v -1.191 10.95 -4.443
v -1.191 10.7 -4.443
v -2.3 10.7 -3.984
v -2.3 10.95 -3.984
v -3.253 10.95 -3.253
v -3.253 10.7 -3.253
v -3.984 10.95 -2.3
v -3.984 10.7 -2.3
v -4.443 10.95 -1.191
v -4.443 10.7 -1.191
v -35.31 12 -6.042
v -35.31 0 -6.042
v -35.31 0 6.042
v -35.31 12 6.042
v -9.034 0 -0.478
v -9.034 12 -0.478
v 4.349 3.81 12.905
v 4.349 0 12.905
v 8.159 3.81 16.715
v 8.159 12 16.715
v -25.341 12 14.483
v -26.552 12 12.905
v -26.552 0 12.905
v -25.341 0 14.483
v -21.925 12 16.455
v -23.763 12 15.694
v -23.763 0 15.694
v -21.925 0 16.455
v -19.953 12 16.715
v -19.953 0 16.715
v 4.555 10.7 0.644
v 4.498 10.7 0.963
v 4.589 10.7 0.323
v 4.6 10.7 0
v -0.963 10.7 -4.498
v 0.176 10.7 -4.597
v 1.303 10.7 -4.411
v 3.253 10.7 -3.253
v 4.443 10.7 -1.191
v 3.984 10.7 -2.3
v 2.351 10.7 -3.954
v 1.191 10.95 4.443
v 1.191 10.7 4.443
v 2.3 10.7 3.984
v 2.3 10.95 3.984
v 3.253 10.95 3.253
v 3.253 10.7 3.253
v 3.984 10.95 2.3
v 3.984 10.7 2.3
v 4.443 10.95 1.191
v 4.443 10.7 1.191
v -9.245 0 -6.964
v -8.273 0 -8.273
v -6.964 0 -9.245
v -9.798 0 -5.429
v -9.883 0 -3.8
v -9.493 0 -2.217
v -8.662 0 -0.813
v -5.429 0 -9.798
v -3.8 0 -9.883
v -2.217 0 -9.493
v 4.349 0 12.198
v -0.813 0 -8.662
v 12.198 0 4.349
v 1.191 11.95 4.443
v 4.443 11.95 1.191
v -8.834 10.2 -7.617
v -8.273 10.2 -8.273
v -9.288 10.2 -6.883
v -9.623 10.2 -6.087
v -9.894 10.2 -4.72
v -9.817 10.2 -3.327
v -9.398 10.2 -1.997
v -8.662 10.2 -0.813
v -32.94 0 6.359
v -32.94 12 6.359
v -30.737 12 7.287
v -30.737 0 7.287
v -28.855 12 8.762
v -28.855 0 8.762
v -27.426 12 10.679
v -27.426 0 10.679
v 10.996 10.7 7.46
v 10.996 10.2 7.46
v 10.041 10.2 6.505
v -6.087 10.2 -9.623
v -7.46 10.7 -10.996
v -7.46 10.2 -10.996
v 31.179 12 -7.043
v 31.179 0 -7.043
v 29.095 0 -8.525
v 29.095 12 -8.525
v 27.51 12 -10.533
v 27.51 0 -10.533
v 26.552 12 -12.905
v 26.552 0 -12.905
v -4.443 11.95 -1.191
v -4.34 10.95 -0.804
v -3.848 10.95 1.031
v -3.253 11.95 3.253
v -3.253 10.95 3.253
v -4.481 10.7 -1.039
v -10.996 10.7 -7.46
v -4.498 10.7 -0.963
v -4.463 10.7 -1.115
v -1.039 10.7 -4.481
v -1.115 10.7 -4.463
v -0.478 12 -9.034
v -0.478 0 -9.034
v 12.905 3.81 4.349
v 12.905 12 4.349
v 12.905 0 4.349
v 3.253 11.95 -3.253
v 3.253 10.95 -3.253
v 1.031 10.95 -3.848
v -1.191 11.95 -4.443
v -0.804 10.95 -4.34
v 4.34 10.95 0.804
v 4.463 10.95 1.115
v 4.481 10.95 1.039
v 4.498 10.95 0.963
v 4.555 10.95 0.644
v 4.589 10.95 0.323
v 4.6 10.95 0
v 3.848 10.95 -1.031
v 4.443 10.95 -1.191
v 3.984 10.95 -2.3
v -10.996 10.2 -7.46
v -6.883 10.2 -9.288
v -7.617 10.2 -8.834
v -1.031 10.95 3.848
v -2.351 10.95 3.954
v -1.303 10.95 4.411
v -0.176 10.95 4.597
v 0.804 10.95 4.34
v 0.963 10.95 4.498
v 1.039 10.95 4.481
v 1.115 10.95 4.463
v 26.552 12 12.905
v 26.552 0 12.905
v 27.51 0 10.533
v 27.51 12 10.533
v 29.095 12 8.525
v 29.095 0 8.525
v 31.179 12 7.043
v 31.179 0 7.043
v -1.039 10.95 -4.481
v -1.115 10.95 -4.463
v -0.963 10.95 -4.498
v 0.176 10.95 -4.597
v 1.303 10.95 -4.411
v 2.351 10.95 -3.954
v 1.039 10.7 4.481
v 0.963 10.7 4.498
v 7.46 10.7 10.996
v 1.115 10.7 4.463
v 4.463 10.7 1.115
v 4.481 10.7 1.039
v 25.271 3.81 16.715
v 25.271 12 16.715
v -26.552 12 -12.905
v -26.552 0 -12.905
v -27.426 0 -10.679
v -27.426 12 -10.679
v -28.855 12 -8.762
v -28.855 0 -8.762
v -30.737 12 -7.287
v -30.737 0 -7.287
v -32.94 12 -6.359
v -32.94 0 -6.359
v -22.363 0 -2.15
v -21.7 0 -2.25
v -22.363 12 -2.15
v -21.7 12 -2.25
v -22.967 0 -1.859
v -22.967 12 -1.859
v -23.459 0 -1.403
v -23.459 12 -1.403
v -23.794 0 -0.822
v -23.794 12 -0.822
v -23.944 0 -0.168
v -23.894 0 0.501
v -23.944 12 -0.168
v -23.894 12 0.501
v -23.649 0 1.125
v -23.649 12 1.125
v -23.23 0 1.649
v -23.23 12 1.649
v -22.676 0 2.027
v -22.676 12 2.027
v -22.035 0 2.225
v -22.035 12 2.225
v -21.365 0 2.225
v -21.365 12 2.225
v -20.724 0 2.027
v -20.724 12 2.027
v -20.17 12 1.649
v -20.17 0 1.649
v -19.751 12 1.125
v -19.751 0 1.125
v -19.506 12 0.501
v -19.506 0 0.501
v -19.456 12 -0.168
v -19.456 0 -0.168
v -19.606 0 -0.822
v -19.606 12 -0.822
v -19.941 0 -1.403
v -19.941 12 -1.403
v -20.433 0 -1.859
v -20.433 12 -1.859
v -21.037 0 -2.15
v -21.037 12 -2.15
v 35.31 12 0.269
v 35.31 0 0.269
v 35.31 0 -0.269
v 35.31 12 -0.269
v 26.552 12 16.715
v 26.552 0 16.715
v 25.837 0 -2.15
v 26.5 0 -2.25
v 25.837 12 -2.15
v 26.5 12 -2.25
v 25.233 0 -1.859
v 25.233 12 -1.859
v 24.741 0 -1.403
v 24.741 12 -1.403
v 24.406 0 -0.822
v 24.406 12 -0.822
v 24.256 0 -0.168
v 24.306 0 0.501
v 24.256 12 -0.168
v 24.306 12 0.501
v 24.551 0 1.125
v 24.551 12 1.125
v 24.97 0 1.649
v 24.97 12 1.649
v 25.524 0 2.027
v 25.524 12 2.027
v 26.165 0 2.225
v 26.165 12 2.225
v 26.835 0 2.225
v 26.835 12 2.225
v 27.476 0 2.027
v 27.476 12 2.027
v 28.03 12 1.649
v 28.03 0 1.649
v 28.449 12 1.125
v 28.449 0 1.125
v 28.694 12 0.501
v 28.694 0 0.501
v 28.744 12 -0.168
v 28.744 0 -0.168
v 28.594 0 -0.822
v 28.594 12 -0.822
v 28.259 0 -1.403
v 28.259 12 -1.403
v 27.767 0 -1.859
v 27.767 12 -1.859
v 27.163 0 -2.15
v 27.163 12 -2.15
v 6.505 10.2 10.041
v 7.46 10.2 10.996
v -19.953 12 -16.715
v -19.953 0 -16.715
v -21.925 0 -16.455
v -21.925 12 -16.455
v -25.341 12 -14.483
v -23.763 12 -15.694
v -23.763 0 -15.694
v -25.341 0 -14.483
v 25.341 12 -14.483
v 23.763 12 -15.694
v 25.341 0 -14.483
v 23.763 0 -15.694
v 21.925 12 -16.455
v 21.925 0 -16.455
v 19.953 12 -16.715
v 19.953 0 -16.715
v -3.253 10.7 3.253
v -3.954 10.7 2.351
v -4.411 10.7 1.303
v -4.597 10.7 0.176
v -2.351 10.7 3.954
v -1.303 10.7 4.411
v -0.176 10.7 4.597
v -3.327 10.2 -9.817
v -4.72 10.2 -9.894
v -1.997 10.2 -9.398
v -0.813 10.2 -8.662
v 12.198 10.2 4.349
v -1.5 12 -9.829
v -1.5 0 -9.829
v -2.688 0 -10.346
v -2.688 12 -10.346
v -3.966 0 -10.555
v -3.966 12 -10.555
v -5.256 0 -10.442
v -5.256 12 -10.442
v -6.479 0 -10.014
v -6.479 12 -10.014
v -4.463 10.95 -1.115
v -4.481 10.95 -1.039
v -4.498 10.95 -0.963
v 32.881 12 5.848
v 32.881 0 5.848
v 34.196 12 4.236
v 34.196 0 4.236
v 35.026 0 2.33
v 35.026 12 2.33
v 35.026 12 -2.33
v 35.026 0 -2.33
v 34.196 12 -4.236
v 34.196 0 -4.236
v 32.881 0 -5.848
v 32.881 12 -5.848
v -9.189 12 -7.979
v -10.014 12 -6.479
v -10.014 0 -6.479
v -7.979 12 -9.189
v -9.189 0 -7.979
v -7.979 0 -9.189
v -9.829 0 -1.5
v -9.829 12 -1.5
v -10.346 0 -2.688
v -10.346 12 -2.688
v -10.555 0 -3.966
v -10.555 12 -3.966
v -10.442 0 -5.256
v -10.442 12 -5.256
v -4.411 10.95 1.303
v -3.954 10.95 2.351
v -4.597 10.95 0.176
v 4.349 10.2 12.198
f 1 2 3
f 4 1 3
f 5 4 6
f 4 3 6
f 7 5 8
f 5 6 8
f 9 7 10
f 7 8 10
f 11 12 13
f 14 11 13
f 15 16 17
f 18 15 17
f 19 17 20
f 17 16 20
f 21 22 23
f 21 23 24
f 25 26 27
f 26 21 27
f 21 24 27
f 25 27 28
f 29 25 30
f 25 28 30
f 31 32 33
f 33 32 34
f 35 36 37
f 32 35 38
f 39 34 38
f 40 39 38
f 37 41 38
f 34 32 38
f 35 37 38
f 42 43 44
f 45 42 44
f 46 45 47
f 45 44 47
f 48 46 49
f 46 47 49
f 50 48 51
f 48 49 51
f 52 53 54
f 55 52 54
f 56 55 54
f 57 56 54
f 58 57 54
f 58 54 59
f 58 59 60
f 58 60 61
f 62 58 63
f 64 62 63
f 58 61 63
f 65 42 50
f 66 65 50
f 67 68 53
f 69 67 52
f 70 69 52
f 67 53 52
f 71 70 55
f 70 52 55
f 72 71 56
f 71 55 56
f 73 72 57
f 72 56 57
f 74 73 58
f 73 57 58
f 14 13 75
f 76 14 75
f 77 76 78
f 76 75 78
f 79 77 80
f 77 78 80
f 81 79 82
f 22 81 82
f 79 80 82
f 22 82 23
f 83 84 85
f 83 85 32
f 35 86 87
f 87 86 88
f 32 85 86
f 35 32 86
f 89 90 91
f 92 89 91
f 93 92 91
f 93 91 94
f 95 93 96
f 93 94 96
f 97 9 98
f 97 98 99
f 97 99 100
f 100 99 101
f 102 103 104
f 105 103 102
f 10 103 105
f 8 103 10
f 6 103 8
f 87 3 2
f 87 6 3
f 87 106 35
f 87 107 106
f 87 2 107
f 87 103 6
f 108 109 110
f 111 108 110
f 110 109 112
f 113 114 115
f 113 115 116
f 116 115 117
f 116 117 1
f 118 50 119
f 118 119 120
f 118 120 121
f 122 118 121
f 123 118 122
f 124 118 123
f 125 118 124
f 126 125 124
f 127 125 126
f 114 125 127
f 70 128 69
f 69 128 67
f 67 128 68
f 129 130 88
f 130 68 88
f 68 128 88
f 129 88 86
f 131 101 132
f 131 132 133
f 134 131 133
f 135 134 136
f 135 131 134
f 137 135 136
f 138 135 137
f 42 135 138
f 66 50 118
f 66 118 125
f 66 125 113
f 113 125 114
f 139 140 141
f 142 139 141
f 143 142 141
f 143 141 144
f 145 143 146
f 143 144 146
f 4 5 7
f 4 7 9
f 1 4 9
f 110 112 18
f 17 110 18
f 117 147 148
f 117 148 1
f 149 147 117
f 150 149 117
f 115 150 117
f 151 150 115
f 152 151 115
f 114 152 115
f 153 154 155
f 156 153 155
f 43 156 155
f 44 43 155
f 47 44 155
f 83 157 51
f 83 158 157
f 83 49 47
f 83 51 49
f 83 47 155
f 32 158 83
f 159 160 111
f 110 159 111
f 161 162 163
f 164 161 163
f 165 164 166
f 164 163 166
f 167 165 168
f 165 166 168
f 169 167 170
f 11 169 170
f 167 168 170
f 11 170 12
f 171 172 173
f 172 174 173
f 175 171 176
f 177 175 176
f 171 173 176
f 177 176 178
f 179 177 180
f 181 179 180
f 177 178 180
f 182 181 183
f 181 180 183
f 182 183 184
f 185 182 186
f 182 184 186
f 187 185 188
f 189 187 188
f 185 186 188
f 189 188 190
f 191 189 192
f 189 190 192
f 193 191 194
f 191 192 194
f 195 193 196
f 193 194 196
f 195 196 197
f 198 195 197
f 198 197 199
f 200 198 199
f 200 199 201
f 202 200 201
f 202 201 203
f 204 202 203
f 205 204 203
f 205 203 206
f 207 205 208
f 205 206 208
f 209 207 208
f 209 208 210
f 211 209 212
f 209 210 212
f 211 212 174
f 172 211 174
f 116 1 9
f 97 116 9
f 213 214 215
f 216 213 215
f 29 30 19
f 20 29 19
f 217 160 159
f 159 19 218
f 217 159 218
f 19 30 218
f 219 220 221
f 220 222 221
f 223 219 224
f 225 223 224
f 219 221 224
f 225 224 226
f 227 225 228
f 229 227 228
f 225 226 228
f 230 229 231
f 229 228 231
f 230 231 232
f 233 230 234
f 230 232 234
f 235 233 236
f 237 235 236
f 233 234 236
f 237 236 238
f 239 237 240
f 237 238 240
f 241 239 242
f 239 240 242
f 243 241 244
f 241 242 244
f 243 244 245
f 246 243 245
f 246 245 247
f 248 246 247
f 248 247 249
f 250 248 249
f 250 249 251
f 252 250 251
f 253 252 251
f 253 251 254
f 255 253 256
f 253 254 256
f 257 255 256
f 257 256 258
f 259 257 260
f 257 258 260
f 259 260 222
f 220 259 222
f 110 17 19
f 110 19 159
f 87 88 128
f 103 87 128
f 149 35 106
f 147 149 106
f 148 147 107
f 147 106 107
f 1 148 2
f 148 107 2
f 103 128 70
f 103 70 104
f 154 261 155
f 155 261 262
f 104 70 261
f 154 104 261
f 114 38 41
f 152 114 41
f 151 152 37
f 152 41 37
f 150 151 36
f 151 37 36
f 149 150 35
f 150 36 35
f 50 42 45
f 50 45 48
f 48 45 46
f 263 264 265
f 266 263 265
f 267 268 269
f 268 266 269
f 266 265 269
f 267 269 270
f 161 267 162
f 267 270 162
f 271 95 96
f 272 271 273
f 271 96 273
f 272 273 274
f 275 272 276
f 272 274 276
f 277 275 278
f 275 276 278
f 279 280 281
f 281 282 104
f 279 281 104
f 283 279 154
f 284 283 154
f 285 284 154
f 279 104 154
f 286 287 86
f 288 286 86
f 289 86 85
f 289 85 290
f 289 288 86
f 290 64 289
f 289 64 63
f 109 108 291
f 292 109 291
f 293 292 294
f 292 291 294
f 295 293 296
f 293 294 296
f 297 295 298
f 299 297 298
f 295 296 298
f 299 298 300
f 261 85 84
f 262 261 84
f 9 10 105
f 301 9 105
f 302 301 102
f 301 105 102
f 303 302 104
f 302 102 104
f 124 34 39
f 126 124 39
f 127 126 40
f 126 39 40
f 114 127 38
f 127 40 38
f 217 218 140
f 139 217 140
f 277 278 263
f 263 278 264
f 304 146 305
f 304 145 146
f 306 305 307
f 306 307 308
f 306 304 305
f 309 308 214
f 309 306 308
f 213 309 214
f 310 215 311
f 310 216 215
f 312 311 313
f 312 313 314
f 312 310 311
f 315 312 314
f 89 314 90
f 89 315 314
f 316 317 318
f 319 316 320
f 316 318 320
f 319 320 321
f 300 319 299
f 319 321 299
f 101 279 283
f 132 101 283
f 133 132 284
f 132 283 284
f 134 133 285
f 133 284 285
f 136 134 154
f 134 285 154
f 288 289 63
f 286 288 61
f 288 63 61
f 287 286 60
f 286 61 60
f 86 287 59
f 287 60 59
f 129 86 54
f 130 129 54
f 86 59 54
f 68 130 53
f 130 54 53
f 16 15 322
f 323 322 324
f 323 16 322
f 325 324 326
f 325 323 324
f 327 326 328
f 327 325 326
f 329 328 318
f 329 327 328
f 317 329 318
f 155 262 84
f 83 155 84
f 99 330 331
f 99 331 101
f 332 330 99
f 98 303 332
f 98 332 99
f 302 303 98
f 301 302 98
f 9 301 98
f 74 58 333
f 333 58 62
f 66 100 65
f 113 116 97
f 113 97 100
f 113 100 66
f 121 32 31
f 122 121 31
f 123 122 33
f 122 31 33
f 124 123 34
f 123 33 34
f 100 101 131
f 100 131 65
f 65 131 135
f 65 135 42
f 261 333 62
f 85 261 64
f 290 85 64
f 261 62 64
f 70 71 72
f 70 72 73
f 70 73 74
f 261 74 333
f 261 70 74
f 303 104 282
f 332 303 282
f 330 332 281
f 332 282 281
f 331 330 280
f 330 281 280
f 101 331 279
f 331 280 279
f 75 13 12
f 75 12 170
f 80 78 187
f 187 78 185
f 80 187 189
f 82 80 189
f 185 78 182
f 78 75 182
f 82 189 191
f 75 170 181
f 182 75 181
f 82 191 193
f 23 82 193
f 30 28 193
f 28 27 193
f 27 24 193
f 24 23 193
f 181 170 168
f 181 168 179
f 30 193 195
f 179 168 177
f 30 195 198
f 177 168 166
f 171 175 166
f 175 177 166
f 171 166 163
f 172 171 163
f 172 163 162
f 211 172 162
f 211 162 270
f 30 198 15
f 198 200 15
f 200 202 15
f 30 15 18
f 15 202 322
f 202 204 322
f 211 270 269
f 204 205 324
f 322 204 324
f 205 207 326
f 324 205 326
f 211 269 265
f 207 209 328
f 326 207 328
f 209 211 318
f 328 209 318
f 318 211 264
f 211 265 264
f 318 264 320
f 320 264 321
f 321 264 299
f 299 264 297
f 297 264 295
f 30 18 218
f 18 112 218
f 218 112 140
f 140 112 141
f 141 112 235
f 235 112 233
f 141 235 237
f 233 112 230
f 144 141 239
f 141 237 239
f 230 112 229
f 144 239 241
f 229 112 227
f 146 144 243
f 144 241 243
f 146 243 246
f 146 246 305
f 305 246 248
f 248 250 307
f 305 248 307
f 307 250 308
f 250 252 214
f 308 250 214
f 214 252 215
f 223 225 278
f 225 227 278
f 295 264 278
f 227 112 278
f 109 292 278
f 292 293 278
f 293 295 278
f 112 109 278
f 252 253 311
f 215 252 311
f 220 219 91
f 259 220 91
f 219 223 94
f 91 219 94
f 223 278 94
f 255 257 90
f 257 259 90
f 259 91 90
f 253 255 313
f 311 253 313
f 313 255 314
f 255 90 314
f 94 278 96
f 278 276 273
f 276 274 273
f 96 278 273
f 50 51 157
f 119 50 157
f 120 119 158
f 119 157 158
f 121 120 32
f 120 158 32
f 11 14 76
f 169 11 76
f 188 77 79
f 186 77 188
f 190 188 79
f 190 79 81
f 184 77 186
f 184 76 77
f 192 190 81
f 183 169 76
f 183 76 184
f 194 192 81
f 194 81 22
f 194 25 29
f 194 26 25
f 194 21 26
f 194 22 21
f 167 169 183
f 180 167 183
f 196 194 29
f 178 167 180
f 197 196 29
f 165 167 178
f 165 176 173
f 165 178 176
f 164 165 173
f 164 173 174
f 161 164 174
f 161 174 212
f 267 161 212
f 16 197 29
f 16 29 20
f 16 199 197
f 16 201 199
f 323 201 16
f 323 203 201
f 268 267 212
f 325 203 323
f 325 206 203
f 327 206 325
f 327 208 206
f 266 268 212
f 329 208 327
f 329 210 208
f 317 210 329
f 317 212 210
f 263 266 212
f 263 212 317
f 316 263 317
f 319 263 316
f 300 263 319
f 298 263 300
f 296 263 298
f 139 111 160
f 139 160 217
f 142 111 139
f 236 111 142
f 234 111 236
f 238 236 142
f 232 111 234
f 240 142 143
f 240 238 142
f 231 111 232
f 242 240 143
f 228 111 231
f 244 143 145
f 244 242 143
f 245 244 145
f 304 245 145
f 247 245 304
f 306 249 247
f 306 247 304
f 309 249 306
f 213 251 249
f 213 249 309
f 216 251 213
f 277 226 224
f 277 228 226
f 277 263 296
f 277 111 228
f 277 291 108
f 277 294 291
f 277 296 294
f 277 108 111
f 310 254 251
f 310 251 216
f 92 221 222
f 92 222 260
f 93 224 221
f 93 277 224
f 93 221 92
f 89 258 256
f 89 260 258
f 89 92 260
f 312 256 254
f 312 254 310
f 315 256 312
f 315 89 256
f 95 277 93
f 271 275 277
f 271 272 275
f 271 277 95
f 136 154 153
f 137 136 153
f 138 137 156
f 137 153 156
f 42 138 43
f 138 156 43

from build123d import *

# Parameters (mm, degrees)
BOSS_EXTRUDE1_DEPTH           = 10.2
BOSS_EXTRUDE2_DEPTH           = 0.5
BOSS_EXTRUDE4_DEPTH           = 0.25
BOSS_EXTRUDE5_DEPTH           = 1.25
BOSS_EXTRUDE6_DEPTH           = 12
CUT_EXTRUDE1_DEPTH            = 41.867802174
CUT_EXTRUDE2_DEPTH            = 8.19
SKETCH10_W                    = 2.25
SKETCH10_H                    = 12
M4_CLEARANCE_HOLE1_AT_2_COUNT = 2
M4_CLEARANCE_HOLE1_AT_2_PITCH = 48.2
FILLET1_R                     = 7.62
FILLET2_R                     = 7.62


with BuildPart() as part:
    # Sketch1 → Boss-Extrude1 (new body)
    with BuildSketch(Plane(origin=(0, 0, 0), x_dir=(1, 0, 0), z_dir=(0, 1, 0))):
        with BuildLine():
            ThreePointArc((-8.273149364, 8.273149316), (-9.899999094, 4.617835693), (-8.66205807, 0.813172798))
            Line((-8.66205807, 0.813172798), (4.348706704, -12.197591975))
            Line((4.348706704, -12.197591975), (12.197591975, -4.348706704))
            Line((12.197591975, -4.348706704), (-0.813172798, 8.66205807))
            ThreePointArc((-0.813172798, 8.66205807), (-4.617835727, 9.899999092), (-8.273149364, 8.273149316))
        make_face()
    extrude(amount=BOSS_EXTRUDE1_DEPTH)

    # Sketch2 → Boss-Extrude2 (add)
    with BuildSketch(Plane(origin=(0, 10.2, 0), x_dir=(1, 0, 0), z_dir=(0, 1, 0))):
        Polygon((-10.995510447, 7.459976542), (7.459976542, -10.995510447), (10.995510447, -7.459976542), (-7.459976542, 10.995510447), align=None)
    extrude(amount=BOSS_EXTRUDE2_DEPTH)



with BuildPart() as body_2:
    # Sketch3 → Boss-Extrude4 (new body)
    with BuildSketch(Plane(origin=(0, 10.7, 0), x_dir=(1, 0, 0), z_dir=(0, 1, 0))):
        with BuildLine():
            Line((2.816913201, -2.816913207), (1.190567607, -4.443258801))
            ThreePointArc((1.190567607, -4.443258801), (3.252691193, -3.252691193), (4.443258801, -1.190567607))
            Line((4.443258801, -1.190567607), (2.816913201, -2.816913207))
        make_face()
        with BuildLine():
            ThreePointArc((-3.252691193, -3.252691193), (-1.303419386, -4.411473439), (0.962617635, -4.498151541))
            Line((0.962617635, -4.498151541), (0.804197277, -4.339731183))
            Line((0.804197277, -4.339731183), (-1.031061719, -3.847975017))
            Line((-1.031061719, -3.847975017), (-3.252691193, -3.252691193))
        make_face()
        with BuildLine():
            Line((0.804197277, -4.339731183), (0.962617635, -4.498151541))
            ThreePointArc((0.962617635, -4.498151541), (1.07694242, -4.472157759), (1.190567607, -4.443258801))
            Line((1.190567607, -4.443258801), (0.804197277, -4.339731183))
        make_face()
        with BuildLine():
            ThreePointArc((-4.443258801, 1.190567607), (-4.472157759, 1.07694242), (-4.498151541, 0.962617635))
            Line((-4.498151541, 0.962617635), (-4.339731183, 0.804197277))
            Line((-4.339731183, 0.804197277), (-4.443258801, 1.190567607))
        make_face()
        with BuildLine():
            Line((-4.339731183, 0.804197277), (-4.498151541, 0.962617635))
            ThreePointArc((-4.498151541, 0.962617635), (-4.411473439, -1.303419386), (-3.252691193, -3.252691193))
            Line((-3.252691193, -3.252691193), (-3.847975039, -1.031061638))
            Line((-3.847975039, -1.031061638), (-4.339731183, 0.804197277))
        make_face()
        with BuildLine():
            ThreePointArc((-1.190567607, 4.443258801), (-3.252691193, 3.252691193), (-4.443258801, 1.190567607))
            Line((-4.443258801, 1.190567607), (-2.816913206, 2.816913202))
            Line((-2.816913206, 2.816913202), (-1.190567607, 4.443258801))
        make_face()
        with BuildLine():
            ThreePointArc((3.252691193, 3.252691193), (1.303419386, 4.411473439), (-0.962617635, 4.498151541))
            Line((-0.962617635, 4.498151541), (-0.804197277, 4.339731183))
            Line((-0.804197277, 4.339731183), (1.03106158, 3.847975054))
            Line((1.03106158, 3.847975054), (3.252691193, 3.252691193))
        make_face()
        with BuildLine():
            Line((-0.804197277, 4.339731183), (-0.962617635, 4.498151541))
            ThreePointArc((-0.962617635, 4.498151541), (-1.07694242, 4.472157759), (-1.190567607, 4.443258801))
            Line((-1.190567607, 4.443258801), (-0.804197277, 4.339731183))
        make_face()
        with BuildLine():
            ThreePointArc((4.443258801, -1.190567607), (4.472157759, -1.07694242), (4.498151541, -0.962617635))
            Line((4.498151541, -0.962617635), (4.339731183, -0.804197277))
            Line((4.339731183, -0.804197277), (4.443258801, -1.190567607))
        make_face()
        with BuildLine():
            Line((4.339731183, -0.804197277), (4.498151541, -0.962617635))
            ThreePointArc((4.498151541, -0.962617635), (4.574467023, -0.483995305), (4.6, 0))
            ThreePointArc((4.6, 0), (4.24984585, 1.760343789), (3.252691193, 3.252691193))
            Line((3.252691193, 3.252691193), (3.847975061, 1.031061553))
            Line((3.847975061, 1.031061553), (4.339731183, -0.804197277))
        make_face()
        with BuildLine():
            ThreePointArc((-3.252691193, -3.252691193), (-1.303419386, -4.411473439), (0.962617635, -4.498151541))
            Line((0.962617635, -4.498151541), (0.804197277, -4.339731183))
            Line((0.804197277, -4.339731183), (-1.031061719, -3.847975017))
            Line((-1.031061719, -3.847975017), (-3.252691193, -3.252691193))
        make_face()
        with BuildLine():
            Line((0.804197277, -4.339731183), (0.962617635, -4.498151541))
            ThreePointArc((0.962617635, -4.498151541), (1.07694242, -4.472157759), (1.190567607, -4.443258801))
            Line((1.190567607, -4.443258801), (0.804197277, -4.339731183))
        make_face()
        with BuildLine():
            ThreePointArc((-4.443258801, 1.190567607), (-4.472157759, 1.07694242), (-4.498151541, 0.962617635))
            Line((-4.498151541, 0.962617635), (-4.339731183, 0.804197277))
            Line((-4.339731183, 0.804197277), (-4.443258801, 1.190567607))
        make_face()
        with BuildLine():
            Line((-4.339731183, 0.804197277), (-4.498151541, 0.962617635))
            ThreePointArc((-4.498151541, 0.962617635), (-4.411473439, -1.303419386), (-3.252691193, -3.252691193))
            Line((-3.252691193, -3.252691193), (-3.847975039, -1.031061638))
            Line((-3.847975039, -1.031061638), (-4.339731183, 0.804197277))
        make_face()
        with BuildLine():
            ThreePointArc((3.252691193, 3.252691193), (1.303419386, 4.411473439), (-0.962617635, 4.498151541))
            Line((-0.962617635, 4.498151541), (-0.804197277, 4.339731183))
            Line((-0.804197277, 4.339731183), (1.03106158, 3.847975054))
            Line((1.03106158, 3.847975054), (3.252691193, 3.252691193))
        make_face()
        with BuildLine():
            Line((-0.804197277, 4.339731183), (-0.962617635, 4.498151541))
            ThreePointArc((-0.962617635, 4.498151541), (-1.07694242, 4.472157759), (-1.190567607, 4.443258801))
            Line((-1.190567607, 4.443258801), (-0.804197277, 4.339731183))
        make_face()
        with BuildLine():
            ThreePointArc((4.443258801, -1.190567607), (4.472157759, -1.07694242), (4.498151541, -0.962617635))
            Line((4.498151541, -0.962617635), (4.339731183, -0.804197277))
            Line((4.339731183, -0.804197277), (4.443258801, -1.190567607))
        make_face()
        with BuildLine():
            Line((4.339731183, -0.804197277), (4.498151541, -0.962617635))
            ThreePointArc((4.498151541, -0.962617635), (4.574467023, -0.483995305), (4.6, 0))
            ThreePointArc((4.6, 0), (4.24984585, 1.760343789), (3.252691193, 3.252691193))
            Line((3.252691193, 3.252691193), (3.847975061, 1.031061553))
            Line((3.847975061, 1.031061553), (4.339731183, -0.804197277))
        make_face()
    extrude(amount=BOSS_EXTRUDE4_DEPTH)


with BuildPart() as part_1:
    add(part.part)

    add(body_2.part)  # Boss-Extrude5 merges body 2
    # Sketch3<3> → Boss-Extrude5 (add)
    with BuildSketch(Plane(origin=(0, 10.7, 0), x_dir=(1, 0, 0), z_dir=(0, 1, 0))):
        Polygon((4.443258801, -1.190567607), (3.252691193, 3.252691193), (-1.190567607, 4.443258801), (-4.443258801, 1.190567607), (-3.252691193, -3.252691193), (1.190567607, -4.443258801), align=None)
    extrude(amount=BOSS_EXTRUDE5_DEPTH)


with BuildPart() as body_2_2:
    # Sketch5 → Boss-Extrude6 (new body)
    with BuildSketch(Plane(origin=(0, 0, 0), x_dir=(1, 0, 0), z_dir=(0, 1, 0))):
        with BuildLine():
            Line((26.551725125, -16.714698757), (26.551725125, -12.904698757))
            ThreePointArc((26.551725125, -12.904698757), (29.746675052, -7.962106389), (35.31, -6.042122046))
            Line((35.31, -6.042122046), (35.31, 6.042122046))
            ThreePointArc((35.31, 6.042122046), (29.746675052, 7.962106389), (26.551725125, 12.904698757))
            Line((26.551725125, 12.904698757), (26.551725125, 16.714698757))
            Line((26.551725125, 16.714698757), (-26.551725125, 16.714698757))
            Line((-26.551725125, 16.714698757), (-26.551725125, 12.904698757))
            ThreePointArc((-26.551725125, 12.904698757), (-29.746675052, 7.962106389), (-35.31, 6.042122046))
            Line((-35.31, 6.042122046), (-35.31, -6.042122046))
            ThreePointArc((-35.31, -6.042122046), (-29.746675052, -7.962106389), (-26.551725125, -12.904698757))
            Line((-26.551725125, -12.904698757), (-26.551725125, -16.714698757))
            Line((-26.551725125, -16.714698757), (26.551725125, -16.714698757))
        make_face()
        with BuildLine():
            Line((-9.033646769, 0.477654716), (-8.66205807, 0.813172798))
            ThreePointArc((-8.66205807, 0.813172798), (-9.8172278, 3.327283506), (-9.622773435, 6.08723953))
            Line((-9.622773435, 6.08723953), (-10.014231548, 6.478697642))
            ThreePointArc((-10.014231548, 6.478697642), (-8.62670273, 8.62670273), (-6.478697642, 10.014231548))
            Line((-6.478697642, 10.014231548), (-6.08723953, 9.622773435))
            ThreePointArc((-6.08723953, 9.622773435), (-3.327283506, 9.8172278), (-0.813172798, 8.66205807))
            Line((-0.813172798, 8.66205807), (-0.477654716, 9.033646769))
            Line((-0.477654716, 9.033646769), (12.904698757, -4.348706704))
            Line((12.904698757, -4.348706704), (4.348706704, -12.904698757))
            Line((4.348706704, -12.904698757), (-9.033646769, 0.477654716))
        make_face(mode=Mode.SUBTRACT)
    extrude(amount=BOSS_EXTRUDE6_DEPTH)

    # Sketch6 → Cut-Extrude1 (cut, through all)
    with BuildSketch(Plane(origin=(0, 12, 0), x_dir=(1, 0, 0), z_dir=(0, 1, 0))):
        with BuildLine():
            ThreePointArc((-9.033646769, 0.477654716), (-10.490761124, 3.320195156), (-10.014231548, 6.478697642))
            Line((-10.014231548, 6.478697642), (-9.622773435, 6.08723953))
            ThreePointArc((-9.622773435, 6.08723953), (-9.8172278, 3.327283506), (-8.66205807, 0.813172798))
            Line((-8.66205807, 0.813172798), (-9.033646769, 0.477654716))
        make_face()
        with BuildLine():
            ThreePointArc((-0.477654716, 9.033646769), (-3.320195156, 10.490761124), (-6.478697642, 10.014231548))
            Line((-6.478697642, 10.014231548), (-6.08723953, 9.622773435))
            ThreePointArc((-6.08723953, 9.622773435), (-3.327283506, 9.8172278), (-0.813172798, 8.66205807))
            Line((-0.813172798, 8.66205807), (-0.477654716, 9.033646769))
        make_face()
    extrude(amount=-CUT_EXTRUDE1_DEPTH, mode=Mode.SUBTRACT)

    # Sketch8 → Cut-Extrude2 (cut)
    with BuildSketch(Plane(origin=(0, 12, 0), x_dir=(1, 0, 0), z_dir=(0, 1, 0))):
        Polygon((12.904698757, -4.348706704), (4.348706704, -12.904698757), (8.158706704, -16.714698757), (25.270690809, -16.714698757), align=None)
    extrude(amount=-CUT_EXTRUDE2_DEPTH, mode=Mode.SUBTRACT)

    # Sketch10 → M4 Clearance Hole1 (revolve, cut)
    with BuildSketch(Plane(origin=(26.5, 0, 0), x_dir=(0, 0, -1), z_dir=(1, 0, 0))):
        with Locations((1.125, 6)):
            Rectangle(SKETCH10_W, SKETCH10_H)
    m4_clearance_hole1 = revolve(axis=Axis((26.5, -6.35, 0), (0, 1, 0)), mode=Mode.SUBTRACT)

    # M4 Clearance Hole1 at 2: M4 Clearance Hole1 ×2
    with Locations(*[(-i * M4_CLEARANCE_HOLE1_AT_2_PITCH, 0, 0) for i in range(1, M4_CLEARANCE_HOLE1_AT_2_COUNT)]):
        add(m4_clearance_hole1, mode=Mode.SUBTRACT)

    # Fillet1
    fillet1_edges = [body_2_2.edges().sort_by_distance(p)[0] for p in [
        (35.31, 6, -6.042122046),
        (35.31, 6, 6.042122046),
    ]]
    fillet(fillet1_edges, radius=FILLET1_R)

    # Fillet2
    # the kernel refuses this fillet: 7.62 mm, written as the material it takes off along each edge
    with BuildSketch(Plane(origin=(-26.551725125, -16.497783942, 16.714698757), x_dir=(1, 0, 0), z_dir=(0, 1, 0))) as fillet2_piece_1:
        with BuildLine():
            CenterArc((6.599113577, 7.62), FILLET2_R, 210, 60)
            Line((0, 3.81), (-0.131982272, 3.7338))
            ThreePointArc((-0.131982272, 3.7338), (-0.1524, 1.905), (-0.1524, 0))
            Line((-0.1524, 0), (0, -0.1524))
            Line((0, -0.1524), (6.599113577, -0.1524))
            Line((6.599113577, -0.1524), (6.599113577, 0))
        make_face()
    extrude(amount=44.995567884, mode=Mode.SUBTRACT)
    with BuildSketch(Plane(origin=(-26.551725125, -16.497783942, -16.714698757), x_dir=(1, 0, 0), z_dir=(0, 1, 0))) as fillet2_piece_2:
        with BuildLine():
            CenterArc((6.599113577, -7.62), FILLET2_R, 90, 60)
            Line((0, -3.81), (-0.131982272, -3.7338))
            ThreePointArc((-0.131982272, -3.7338), (-0.1524, -1.905), (-0.1524, 0))
            Line((-0.1524, 0), (0, 0.1524))
            Line((0, 0.1524), (6.599113577, 0.1524))
            Line((6.599113577, 0.1524), (6.599113577, 0))
        make_face()
    extrude(amount=44.995567884, mode=Mode.SUBTRACT)
    with BuildSketch(Plane(origin=(26.551725125, -16.497783942, -16.714698757), x_dir=(0, 0, 1), z_dir=(0, 1, 0))) as fillet2_piece_3:
        with BuildLine():
            CenterArc((7.62, -6.599113577), FILLET2_R, 120, 60)
            Line((0, -6.599113577), (-0.1524, -6.599113577))
            Line((-0.1524, -6.599113577), (-0.1524, 0))
            Line((-0.1524, 0), (0, 0.1524))
            ThreePointArc((0, 0.1524), (1.905, 0.1524), (3.7338, 0.131982272))
            Line((3.7338, 0.131982272), (3.81, 0))
        make_face()
    extrude(amount=44.995567884, mode=Mode.SUBTRACT)


solid = Compound([part_1.part, body_2_2.part])
